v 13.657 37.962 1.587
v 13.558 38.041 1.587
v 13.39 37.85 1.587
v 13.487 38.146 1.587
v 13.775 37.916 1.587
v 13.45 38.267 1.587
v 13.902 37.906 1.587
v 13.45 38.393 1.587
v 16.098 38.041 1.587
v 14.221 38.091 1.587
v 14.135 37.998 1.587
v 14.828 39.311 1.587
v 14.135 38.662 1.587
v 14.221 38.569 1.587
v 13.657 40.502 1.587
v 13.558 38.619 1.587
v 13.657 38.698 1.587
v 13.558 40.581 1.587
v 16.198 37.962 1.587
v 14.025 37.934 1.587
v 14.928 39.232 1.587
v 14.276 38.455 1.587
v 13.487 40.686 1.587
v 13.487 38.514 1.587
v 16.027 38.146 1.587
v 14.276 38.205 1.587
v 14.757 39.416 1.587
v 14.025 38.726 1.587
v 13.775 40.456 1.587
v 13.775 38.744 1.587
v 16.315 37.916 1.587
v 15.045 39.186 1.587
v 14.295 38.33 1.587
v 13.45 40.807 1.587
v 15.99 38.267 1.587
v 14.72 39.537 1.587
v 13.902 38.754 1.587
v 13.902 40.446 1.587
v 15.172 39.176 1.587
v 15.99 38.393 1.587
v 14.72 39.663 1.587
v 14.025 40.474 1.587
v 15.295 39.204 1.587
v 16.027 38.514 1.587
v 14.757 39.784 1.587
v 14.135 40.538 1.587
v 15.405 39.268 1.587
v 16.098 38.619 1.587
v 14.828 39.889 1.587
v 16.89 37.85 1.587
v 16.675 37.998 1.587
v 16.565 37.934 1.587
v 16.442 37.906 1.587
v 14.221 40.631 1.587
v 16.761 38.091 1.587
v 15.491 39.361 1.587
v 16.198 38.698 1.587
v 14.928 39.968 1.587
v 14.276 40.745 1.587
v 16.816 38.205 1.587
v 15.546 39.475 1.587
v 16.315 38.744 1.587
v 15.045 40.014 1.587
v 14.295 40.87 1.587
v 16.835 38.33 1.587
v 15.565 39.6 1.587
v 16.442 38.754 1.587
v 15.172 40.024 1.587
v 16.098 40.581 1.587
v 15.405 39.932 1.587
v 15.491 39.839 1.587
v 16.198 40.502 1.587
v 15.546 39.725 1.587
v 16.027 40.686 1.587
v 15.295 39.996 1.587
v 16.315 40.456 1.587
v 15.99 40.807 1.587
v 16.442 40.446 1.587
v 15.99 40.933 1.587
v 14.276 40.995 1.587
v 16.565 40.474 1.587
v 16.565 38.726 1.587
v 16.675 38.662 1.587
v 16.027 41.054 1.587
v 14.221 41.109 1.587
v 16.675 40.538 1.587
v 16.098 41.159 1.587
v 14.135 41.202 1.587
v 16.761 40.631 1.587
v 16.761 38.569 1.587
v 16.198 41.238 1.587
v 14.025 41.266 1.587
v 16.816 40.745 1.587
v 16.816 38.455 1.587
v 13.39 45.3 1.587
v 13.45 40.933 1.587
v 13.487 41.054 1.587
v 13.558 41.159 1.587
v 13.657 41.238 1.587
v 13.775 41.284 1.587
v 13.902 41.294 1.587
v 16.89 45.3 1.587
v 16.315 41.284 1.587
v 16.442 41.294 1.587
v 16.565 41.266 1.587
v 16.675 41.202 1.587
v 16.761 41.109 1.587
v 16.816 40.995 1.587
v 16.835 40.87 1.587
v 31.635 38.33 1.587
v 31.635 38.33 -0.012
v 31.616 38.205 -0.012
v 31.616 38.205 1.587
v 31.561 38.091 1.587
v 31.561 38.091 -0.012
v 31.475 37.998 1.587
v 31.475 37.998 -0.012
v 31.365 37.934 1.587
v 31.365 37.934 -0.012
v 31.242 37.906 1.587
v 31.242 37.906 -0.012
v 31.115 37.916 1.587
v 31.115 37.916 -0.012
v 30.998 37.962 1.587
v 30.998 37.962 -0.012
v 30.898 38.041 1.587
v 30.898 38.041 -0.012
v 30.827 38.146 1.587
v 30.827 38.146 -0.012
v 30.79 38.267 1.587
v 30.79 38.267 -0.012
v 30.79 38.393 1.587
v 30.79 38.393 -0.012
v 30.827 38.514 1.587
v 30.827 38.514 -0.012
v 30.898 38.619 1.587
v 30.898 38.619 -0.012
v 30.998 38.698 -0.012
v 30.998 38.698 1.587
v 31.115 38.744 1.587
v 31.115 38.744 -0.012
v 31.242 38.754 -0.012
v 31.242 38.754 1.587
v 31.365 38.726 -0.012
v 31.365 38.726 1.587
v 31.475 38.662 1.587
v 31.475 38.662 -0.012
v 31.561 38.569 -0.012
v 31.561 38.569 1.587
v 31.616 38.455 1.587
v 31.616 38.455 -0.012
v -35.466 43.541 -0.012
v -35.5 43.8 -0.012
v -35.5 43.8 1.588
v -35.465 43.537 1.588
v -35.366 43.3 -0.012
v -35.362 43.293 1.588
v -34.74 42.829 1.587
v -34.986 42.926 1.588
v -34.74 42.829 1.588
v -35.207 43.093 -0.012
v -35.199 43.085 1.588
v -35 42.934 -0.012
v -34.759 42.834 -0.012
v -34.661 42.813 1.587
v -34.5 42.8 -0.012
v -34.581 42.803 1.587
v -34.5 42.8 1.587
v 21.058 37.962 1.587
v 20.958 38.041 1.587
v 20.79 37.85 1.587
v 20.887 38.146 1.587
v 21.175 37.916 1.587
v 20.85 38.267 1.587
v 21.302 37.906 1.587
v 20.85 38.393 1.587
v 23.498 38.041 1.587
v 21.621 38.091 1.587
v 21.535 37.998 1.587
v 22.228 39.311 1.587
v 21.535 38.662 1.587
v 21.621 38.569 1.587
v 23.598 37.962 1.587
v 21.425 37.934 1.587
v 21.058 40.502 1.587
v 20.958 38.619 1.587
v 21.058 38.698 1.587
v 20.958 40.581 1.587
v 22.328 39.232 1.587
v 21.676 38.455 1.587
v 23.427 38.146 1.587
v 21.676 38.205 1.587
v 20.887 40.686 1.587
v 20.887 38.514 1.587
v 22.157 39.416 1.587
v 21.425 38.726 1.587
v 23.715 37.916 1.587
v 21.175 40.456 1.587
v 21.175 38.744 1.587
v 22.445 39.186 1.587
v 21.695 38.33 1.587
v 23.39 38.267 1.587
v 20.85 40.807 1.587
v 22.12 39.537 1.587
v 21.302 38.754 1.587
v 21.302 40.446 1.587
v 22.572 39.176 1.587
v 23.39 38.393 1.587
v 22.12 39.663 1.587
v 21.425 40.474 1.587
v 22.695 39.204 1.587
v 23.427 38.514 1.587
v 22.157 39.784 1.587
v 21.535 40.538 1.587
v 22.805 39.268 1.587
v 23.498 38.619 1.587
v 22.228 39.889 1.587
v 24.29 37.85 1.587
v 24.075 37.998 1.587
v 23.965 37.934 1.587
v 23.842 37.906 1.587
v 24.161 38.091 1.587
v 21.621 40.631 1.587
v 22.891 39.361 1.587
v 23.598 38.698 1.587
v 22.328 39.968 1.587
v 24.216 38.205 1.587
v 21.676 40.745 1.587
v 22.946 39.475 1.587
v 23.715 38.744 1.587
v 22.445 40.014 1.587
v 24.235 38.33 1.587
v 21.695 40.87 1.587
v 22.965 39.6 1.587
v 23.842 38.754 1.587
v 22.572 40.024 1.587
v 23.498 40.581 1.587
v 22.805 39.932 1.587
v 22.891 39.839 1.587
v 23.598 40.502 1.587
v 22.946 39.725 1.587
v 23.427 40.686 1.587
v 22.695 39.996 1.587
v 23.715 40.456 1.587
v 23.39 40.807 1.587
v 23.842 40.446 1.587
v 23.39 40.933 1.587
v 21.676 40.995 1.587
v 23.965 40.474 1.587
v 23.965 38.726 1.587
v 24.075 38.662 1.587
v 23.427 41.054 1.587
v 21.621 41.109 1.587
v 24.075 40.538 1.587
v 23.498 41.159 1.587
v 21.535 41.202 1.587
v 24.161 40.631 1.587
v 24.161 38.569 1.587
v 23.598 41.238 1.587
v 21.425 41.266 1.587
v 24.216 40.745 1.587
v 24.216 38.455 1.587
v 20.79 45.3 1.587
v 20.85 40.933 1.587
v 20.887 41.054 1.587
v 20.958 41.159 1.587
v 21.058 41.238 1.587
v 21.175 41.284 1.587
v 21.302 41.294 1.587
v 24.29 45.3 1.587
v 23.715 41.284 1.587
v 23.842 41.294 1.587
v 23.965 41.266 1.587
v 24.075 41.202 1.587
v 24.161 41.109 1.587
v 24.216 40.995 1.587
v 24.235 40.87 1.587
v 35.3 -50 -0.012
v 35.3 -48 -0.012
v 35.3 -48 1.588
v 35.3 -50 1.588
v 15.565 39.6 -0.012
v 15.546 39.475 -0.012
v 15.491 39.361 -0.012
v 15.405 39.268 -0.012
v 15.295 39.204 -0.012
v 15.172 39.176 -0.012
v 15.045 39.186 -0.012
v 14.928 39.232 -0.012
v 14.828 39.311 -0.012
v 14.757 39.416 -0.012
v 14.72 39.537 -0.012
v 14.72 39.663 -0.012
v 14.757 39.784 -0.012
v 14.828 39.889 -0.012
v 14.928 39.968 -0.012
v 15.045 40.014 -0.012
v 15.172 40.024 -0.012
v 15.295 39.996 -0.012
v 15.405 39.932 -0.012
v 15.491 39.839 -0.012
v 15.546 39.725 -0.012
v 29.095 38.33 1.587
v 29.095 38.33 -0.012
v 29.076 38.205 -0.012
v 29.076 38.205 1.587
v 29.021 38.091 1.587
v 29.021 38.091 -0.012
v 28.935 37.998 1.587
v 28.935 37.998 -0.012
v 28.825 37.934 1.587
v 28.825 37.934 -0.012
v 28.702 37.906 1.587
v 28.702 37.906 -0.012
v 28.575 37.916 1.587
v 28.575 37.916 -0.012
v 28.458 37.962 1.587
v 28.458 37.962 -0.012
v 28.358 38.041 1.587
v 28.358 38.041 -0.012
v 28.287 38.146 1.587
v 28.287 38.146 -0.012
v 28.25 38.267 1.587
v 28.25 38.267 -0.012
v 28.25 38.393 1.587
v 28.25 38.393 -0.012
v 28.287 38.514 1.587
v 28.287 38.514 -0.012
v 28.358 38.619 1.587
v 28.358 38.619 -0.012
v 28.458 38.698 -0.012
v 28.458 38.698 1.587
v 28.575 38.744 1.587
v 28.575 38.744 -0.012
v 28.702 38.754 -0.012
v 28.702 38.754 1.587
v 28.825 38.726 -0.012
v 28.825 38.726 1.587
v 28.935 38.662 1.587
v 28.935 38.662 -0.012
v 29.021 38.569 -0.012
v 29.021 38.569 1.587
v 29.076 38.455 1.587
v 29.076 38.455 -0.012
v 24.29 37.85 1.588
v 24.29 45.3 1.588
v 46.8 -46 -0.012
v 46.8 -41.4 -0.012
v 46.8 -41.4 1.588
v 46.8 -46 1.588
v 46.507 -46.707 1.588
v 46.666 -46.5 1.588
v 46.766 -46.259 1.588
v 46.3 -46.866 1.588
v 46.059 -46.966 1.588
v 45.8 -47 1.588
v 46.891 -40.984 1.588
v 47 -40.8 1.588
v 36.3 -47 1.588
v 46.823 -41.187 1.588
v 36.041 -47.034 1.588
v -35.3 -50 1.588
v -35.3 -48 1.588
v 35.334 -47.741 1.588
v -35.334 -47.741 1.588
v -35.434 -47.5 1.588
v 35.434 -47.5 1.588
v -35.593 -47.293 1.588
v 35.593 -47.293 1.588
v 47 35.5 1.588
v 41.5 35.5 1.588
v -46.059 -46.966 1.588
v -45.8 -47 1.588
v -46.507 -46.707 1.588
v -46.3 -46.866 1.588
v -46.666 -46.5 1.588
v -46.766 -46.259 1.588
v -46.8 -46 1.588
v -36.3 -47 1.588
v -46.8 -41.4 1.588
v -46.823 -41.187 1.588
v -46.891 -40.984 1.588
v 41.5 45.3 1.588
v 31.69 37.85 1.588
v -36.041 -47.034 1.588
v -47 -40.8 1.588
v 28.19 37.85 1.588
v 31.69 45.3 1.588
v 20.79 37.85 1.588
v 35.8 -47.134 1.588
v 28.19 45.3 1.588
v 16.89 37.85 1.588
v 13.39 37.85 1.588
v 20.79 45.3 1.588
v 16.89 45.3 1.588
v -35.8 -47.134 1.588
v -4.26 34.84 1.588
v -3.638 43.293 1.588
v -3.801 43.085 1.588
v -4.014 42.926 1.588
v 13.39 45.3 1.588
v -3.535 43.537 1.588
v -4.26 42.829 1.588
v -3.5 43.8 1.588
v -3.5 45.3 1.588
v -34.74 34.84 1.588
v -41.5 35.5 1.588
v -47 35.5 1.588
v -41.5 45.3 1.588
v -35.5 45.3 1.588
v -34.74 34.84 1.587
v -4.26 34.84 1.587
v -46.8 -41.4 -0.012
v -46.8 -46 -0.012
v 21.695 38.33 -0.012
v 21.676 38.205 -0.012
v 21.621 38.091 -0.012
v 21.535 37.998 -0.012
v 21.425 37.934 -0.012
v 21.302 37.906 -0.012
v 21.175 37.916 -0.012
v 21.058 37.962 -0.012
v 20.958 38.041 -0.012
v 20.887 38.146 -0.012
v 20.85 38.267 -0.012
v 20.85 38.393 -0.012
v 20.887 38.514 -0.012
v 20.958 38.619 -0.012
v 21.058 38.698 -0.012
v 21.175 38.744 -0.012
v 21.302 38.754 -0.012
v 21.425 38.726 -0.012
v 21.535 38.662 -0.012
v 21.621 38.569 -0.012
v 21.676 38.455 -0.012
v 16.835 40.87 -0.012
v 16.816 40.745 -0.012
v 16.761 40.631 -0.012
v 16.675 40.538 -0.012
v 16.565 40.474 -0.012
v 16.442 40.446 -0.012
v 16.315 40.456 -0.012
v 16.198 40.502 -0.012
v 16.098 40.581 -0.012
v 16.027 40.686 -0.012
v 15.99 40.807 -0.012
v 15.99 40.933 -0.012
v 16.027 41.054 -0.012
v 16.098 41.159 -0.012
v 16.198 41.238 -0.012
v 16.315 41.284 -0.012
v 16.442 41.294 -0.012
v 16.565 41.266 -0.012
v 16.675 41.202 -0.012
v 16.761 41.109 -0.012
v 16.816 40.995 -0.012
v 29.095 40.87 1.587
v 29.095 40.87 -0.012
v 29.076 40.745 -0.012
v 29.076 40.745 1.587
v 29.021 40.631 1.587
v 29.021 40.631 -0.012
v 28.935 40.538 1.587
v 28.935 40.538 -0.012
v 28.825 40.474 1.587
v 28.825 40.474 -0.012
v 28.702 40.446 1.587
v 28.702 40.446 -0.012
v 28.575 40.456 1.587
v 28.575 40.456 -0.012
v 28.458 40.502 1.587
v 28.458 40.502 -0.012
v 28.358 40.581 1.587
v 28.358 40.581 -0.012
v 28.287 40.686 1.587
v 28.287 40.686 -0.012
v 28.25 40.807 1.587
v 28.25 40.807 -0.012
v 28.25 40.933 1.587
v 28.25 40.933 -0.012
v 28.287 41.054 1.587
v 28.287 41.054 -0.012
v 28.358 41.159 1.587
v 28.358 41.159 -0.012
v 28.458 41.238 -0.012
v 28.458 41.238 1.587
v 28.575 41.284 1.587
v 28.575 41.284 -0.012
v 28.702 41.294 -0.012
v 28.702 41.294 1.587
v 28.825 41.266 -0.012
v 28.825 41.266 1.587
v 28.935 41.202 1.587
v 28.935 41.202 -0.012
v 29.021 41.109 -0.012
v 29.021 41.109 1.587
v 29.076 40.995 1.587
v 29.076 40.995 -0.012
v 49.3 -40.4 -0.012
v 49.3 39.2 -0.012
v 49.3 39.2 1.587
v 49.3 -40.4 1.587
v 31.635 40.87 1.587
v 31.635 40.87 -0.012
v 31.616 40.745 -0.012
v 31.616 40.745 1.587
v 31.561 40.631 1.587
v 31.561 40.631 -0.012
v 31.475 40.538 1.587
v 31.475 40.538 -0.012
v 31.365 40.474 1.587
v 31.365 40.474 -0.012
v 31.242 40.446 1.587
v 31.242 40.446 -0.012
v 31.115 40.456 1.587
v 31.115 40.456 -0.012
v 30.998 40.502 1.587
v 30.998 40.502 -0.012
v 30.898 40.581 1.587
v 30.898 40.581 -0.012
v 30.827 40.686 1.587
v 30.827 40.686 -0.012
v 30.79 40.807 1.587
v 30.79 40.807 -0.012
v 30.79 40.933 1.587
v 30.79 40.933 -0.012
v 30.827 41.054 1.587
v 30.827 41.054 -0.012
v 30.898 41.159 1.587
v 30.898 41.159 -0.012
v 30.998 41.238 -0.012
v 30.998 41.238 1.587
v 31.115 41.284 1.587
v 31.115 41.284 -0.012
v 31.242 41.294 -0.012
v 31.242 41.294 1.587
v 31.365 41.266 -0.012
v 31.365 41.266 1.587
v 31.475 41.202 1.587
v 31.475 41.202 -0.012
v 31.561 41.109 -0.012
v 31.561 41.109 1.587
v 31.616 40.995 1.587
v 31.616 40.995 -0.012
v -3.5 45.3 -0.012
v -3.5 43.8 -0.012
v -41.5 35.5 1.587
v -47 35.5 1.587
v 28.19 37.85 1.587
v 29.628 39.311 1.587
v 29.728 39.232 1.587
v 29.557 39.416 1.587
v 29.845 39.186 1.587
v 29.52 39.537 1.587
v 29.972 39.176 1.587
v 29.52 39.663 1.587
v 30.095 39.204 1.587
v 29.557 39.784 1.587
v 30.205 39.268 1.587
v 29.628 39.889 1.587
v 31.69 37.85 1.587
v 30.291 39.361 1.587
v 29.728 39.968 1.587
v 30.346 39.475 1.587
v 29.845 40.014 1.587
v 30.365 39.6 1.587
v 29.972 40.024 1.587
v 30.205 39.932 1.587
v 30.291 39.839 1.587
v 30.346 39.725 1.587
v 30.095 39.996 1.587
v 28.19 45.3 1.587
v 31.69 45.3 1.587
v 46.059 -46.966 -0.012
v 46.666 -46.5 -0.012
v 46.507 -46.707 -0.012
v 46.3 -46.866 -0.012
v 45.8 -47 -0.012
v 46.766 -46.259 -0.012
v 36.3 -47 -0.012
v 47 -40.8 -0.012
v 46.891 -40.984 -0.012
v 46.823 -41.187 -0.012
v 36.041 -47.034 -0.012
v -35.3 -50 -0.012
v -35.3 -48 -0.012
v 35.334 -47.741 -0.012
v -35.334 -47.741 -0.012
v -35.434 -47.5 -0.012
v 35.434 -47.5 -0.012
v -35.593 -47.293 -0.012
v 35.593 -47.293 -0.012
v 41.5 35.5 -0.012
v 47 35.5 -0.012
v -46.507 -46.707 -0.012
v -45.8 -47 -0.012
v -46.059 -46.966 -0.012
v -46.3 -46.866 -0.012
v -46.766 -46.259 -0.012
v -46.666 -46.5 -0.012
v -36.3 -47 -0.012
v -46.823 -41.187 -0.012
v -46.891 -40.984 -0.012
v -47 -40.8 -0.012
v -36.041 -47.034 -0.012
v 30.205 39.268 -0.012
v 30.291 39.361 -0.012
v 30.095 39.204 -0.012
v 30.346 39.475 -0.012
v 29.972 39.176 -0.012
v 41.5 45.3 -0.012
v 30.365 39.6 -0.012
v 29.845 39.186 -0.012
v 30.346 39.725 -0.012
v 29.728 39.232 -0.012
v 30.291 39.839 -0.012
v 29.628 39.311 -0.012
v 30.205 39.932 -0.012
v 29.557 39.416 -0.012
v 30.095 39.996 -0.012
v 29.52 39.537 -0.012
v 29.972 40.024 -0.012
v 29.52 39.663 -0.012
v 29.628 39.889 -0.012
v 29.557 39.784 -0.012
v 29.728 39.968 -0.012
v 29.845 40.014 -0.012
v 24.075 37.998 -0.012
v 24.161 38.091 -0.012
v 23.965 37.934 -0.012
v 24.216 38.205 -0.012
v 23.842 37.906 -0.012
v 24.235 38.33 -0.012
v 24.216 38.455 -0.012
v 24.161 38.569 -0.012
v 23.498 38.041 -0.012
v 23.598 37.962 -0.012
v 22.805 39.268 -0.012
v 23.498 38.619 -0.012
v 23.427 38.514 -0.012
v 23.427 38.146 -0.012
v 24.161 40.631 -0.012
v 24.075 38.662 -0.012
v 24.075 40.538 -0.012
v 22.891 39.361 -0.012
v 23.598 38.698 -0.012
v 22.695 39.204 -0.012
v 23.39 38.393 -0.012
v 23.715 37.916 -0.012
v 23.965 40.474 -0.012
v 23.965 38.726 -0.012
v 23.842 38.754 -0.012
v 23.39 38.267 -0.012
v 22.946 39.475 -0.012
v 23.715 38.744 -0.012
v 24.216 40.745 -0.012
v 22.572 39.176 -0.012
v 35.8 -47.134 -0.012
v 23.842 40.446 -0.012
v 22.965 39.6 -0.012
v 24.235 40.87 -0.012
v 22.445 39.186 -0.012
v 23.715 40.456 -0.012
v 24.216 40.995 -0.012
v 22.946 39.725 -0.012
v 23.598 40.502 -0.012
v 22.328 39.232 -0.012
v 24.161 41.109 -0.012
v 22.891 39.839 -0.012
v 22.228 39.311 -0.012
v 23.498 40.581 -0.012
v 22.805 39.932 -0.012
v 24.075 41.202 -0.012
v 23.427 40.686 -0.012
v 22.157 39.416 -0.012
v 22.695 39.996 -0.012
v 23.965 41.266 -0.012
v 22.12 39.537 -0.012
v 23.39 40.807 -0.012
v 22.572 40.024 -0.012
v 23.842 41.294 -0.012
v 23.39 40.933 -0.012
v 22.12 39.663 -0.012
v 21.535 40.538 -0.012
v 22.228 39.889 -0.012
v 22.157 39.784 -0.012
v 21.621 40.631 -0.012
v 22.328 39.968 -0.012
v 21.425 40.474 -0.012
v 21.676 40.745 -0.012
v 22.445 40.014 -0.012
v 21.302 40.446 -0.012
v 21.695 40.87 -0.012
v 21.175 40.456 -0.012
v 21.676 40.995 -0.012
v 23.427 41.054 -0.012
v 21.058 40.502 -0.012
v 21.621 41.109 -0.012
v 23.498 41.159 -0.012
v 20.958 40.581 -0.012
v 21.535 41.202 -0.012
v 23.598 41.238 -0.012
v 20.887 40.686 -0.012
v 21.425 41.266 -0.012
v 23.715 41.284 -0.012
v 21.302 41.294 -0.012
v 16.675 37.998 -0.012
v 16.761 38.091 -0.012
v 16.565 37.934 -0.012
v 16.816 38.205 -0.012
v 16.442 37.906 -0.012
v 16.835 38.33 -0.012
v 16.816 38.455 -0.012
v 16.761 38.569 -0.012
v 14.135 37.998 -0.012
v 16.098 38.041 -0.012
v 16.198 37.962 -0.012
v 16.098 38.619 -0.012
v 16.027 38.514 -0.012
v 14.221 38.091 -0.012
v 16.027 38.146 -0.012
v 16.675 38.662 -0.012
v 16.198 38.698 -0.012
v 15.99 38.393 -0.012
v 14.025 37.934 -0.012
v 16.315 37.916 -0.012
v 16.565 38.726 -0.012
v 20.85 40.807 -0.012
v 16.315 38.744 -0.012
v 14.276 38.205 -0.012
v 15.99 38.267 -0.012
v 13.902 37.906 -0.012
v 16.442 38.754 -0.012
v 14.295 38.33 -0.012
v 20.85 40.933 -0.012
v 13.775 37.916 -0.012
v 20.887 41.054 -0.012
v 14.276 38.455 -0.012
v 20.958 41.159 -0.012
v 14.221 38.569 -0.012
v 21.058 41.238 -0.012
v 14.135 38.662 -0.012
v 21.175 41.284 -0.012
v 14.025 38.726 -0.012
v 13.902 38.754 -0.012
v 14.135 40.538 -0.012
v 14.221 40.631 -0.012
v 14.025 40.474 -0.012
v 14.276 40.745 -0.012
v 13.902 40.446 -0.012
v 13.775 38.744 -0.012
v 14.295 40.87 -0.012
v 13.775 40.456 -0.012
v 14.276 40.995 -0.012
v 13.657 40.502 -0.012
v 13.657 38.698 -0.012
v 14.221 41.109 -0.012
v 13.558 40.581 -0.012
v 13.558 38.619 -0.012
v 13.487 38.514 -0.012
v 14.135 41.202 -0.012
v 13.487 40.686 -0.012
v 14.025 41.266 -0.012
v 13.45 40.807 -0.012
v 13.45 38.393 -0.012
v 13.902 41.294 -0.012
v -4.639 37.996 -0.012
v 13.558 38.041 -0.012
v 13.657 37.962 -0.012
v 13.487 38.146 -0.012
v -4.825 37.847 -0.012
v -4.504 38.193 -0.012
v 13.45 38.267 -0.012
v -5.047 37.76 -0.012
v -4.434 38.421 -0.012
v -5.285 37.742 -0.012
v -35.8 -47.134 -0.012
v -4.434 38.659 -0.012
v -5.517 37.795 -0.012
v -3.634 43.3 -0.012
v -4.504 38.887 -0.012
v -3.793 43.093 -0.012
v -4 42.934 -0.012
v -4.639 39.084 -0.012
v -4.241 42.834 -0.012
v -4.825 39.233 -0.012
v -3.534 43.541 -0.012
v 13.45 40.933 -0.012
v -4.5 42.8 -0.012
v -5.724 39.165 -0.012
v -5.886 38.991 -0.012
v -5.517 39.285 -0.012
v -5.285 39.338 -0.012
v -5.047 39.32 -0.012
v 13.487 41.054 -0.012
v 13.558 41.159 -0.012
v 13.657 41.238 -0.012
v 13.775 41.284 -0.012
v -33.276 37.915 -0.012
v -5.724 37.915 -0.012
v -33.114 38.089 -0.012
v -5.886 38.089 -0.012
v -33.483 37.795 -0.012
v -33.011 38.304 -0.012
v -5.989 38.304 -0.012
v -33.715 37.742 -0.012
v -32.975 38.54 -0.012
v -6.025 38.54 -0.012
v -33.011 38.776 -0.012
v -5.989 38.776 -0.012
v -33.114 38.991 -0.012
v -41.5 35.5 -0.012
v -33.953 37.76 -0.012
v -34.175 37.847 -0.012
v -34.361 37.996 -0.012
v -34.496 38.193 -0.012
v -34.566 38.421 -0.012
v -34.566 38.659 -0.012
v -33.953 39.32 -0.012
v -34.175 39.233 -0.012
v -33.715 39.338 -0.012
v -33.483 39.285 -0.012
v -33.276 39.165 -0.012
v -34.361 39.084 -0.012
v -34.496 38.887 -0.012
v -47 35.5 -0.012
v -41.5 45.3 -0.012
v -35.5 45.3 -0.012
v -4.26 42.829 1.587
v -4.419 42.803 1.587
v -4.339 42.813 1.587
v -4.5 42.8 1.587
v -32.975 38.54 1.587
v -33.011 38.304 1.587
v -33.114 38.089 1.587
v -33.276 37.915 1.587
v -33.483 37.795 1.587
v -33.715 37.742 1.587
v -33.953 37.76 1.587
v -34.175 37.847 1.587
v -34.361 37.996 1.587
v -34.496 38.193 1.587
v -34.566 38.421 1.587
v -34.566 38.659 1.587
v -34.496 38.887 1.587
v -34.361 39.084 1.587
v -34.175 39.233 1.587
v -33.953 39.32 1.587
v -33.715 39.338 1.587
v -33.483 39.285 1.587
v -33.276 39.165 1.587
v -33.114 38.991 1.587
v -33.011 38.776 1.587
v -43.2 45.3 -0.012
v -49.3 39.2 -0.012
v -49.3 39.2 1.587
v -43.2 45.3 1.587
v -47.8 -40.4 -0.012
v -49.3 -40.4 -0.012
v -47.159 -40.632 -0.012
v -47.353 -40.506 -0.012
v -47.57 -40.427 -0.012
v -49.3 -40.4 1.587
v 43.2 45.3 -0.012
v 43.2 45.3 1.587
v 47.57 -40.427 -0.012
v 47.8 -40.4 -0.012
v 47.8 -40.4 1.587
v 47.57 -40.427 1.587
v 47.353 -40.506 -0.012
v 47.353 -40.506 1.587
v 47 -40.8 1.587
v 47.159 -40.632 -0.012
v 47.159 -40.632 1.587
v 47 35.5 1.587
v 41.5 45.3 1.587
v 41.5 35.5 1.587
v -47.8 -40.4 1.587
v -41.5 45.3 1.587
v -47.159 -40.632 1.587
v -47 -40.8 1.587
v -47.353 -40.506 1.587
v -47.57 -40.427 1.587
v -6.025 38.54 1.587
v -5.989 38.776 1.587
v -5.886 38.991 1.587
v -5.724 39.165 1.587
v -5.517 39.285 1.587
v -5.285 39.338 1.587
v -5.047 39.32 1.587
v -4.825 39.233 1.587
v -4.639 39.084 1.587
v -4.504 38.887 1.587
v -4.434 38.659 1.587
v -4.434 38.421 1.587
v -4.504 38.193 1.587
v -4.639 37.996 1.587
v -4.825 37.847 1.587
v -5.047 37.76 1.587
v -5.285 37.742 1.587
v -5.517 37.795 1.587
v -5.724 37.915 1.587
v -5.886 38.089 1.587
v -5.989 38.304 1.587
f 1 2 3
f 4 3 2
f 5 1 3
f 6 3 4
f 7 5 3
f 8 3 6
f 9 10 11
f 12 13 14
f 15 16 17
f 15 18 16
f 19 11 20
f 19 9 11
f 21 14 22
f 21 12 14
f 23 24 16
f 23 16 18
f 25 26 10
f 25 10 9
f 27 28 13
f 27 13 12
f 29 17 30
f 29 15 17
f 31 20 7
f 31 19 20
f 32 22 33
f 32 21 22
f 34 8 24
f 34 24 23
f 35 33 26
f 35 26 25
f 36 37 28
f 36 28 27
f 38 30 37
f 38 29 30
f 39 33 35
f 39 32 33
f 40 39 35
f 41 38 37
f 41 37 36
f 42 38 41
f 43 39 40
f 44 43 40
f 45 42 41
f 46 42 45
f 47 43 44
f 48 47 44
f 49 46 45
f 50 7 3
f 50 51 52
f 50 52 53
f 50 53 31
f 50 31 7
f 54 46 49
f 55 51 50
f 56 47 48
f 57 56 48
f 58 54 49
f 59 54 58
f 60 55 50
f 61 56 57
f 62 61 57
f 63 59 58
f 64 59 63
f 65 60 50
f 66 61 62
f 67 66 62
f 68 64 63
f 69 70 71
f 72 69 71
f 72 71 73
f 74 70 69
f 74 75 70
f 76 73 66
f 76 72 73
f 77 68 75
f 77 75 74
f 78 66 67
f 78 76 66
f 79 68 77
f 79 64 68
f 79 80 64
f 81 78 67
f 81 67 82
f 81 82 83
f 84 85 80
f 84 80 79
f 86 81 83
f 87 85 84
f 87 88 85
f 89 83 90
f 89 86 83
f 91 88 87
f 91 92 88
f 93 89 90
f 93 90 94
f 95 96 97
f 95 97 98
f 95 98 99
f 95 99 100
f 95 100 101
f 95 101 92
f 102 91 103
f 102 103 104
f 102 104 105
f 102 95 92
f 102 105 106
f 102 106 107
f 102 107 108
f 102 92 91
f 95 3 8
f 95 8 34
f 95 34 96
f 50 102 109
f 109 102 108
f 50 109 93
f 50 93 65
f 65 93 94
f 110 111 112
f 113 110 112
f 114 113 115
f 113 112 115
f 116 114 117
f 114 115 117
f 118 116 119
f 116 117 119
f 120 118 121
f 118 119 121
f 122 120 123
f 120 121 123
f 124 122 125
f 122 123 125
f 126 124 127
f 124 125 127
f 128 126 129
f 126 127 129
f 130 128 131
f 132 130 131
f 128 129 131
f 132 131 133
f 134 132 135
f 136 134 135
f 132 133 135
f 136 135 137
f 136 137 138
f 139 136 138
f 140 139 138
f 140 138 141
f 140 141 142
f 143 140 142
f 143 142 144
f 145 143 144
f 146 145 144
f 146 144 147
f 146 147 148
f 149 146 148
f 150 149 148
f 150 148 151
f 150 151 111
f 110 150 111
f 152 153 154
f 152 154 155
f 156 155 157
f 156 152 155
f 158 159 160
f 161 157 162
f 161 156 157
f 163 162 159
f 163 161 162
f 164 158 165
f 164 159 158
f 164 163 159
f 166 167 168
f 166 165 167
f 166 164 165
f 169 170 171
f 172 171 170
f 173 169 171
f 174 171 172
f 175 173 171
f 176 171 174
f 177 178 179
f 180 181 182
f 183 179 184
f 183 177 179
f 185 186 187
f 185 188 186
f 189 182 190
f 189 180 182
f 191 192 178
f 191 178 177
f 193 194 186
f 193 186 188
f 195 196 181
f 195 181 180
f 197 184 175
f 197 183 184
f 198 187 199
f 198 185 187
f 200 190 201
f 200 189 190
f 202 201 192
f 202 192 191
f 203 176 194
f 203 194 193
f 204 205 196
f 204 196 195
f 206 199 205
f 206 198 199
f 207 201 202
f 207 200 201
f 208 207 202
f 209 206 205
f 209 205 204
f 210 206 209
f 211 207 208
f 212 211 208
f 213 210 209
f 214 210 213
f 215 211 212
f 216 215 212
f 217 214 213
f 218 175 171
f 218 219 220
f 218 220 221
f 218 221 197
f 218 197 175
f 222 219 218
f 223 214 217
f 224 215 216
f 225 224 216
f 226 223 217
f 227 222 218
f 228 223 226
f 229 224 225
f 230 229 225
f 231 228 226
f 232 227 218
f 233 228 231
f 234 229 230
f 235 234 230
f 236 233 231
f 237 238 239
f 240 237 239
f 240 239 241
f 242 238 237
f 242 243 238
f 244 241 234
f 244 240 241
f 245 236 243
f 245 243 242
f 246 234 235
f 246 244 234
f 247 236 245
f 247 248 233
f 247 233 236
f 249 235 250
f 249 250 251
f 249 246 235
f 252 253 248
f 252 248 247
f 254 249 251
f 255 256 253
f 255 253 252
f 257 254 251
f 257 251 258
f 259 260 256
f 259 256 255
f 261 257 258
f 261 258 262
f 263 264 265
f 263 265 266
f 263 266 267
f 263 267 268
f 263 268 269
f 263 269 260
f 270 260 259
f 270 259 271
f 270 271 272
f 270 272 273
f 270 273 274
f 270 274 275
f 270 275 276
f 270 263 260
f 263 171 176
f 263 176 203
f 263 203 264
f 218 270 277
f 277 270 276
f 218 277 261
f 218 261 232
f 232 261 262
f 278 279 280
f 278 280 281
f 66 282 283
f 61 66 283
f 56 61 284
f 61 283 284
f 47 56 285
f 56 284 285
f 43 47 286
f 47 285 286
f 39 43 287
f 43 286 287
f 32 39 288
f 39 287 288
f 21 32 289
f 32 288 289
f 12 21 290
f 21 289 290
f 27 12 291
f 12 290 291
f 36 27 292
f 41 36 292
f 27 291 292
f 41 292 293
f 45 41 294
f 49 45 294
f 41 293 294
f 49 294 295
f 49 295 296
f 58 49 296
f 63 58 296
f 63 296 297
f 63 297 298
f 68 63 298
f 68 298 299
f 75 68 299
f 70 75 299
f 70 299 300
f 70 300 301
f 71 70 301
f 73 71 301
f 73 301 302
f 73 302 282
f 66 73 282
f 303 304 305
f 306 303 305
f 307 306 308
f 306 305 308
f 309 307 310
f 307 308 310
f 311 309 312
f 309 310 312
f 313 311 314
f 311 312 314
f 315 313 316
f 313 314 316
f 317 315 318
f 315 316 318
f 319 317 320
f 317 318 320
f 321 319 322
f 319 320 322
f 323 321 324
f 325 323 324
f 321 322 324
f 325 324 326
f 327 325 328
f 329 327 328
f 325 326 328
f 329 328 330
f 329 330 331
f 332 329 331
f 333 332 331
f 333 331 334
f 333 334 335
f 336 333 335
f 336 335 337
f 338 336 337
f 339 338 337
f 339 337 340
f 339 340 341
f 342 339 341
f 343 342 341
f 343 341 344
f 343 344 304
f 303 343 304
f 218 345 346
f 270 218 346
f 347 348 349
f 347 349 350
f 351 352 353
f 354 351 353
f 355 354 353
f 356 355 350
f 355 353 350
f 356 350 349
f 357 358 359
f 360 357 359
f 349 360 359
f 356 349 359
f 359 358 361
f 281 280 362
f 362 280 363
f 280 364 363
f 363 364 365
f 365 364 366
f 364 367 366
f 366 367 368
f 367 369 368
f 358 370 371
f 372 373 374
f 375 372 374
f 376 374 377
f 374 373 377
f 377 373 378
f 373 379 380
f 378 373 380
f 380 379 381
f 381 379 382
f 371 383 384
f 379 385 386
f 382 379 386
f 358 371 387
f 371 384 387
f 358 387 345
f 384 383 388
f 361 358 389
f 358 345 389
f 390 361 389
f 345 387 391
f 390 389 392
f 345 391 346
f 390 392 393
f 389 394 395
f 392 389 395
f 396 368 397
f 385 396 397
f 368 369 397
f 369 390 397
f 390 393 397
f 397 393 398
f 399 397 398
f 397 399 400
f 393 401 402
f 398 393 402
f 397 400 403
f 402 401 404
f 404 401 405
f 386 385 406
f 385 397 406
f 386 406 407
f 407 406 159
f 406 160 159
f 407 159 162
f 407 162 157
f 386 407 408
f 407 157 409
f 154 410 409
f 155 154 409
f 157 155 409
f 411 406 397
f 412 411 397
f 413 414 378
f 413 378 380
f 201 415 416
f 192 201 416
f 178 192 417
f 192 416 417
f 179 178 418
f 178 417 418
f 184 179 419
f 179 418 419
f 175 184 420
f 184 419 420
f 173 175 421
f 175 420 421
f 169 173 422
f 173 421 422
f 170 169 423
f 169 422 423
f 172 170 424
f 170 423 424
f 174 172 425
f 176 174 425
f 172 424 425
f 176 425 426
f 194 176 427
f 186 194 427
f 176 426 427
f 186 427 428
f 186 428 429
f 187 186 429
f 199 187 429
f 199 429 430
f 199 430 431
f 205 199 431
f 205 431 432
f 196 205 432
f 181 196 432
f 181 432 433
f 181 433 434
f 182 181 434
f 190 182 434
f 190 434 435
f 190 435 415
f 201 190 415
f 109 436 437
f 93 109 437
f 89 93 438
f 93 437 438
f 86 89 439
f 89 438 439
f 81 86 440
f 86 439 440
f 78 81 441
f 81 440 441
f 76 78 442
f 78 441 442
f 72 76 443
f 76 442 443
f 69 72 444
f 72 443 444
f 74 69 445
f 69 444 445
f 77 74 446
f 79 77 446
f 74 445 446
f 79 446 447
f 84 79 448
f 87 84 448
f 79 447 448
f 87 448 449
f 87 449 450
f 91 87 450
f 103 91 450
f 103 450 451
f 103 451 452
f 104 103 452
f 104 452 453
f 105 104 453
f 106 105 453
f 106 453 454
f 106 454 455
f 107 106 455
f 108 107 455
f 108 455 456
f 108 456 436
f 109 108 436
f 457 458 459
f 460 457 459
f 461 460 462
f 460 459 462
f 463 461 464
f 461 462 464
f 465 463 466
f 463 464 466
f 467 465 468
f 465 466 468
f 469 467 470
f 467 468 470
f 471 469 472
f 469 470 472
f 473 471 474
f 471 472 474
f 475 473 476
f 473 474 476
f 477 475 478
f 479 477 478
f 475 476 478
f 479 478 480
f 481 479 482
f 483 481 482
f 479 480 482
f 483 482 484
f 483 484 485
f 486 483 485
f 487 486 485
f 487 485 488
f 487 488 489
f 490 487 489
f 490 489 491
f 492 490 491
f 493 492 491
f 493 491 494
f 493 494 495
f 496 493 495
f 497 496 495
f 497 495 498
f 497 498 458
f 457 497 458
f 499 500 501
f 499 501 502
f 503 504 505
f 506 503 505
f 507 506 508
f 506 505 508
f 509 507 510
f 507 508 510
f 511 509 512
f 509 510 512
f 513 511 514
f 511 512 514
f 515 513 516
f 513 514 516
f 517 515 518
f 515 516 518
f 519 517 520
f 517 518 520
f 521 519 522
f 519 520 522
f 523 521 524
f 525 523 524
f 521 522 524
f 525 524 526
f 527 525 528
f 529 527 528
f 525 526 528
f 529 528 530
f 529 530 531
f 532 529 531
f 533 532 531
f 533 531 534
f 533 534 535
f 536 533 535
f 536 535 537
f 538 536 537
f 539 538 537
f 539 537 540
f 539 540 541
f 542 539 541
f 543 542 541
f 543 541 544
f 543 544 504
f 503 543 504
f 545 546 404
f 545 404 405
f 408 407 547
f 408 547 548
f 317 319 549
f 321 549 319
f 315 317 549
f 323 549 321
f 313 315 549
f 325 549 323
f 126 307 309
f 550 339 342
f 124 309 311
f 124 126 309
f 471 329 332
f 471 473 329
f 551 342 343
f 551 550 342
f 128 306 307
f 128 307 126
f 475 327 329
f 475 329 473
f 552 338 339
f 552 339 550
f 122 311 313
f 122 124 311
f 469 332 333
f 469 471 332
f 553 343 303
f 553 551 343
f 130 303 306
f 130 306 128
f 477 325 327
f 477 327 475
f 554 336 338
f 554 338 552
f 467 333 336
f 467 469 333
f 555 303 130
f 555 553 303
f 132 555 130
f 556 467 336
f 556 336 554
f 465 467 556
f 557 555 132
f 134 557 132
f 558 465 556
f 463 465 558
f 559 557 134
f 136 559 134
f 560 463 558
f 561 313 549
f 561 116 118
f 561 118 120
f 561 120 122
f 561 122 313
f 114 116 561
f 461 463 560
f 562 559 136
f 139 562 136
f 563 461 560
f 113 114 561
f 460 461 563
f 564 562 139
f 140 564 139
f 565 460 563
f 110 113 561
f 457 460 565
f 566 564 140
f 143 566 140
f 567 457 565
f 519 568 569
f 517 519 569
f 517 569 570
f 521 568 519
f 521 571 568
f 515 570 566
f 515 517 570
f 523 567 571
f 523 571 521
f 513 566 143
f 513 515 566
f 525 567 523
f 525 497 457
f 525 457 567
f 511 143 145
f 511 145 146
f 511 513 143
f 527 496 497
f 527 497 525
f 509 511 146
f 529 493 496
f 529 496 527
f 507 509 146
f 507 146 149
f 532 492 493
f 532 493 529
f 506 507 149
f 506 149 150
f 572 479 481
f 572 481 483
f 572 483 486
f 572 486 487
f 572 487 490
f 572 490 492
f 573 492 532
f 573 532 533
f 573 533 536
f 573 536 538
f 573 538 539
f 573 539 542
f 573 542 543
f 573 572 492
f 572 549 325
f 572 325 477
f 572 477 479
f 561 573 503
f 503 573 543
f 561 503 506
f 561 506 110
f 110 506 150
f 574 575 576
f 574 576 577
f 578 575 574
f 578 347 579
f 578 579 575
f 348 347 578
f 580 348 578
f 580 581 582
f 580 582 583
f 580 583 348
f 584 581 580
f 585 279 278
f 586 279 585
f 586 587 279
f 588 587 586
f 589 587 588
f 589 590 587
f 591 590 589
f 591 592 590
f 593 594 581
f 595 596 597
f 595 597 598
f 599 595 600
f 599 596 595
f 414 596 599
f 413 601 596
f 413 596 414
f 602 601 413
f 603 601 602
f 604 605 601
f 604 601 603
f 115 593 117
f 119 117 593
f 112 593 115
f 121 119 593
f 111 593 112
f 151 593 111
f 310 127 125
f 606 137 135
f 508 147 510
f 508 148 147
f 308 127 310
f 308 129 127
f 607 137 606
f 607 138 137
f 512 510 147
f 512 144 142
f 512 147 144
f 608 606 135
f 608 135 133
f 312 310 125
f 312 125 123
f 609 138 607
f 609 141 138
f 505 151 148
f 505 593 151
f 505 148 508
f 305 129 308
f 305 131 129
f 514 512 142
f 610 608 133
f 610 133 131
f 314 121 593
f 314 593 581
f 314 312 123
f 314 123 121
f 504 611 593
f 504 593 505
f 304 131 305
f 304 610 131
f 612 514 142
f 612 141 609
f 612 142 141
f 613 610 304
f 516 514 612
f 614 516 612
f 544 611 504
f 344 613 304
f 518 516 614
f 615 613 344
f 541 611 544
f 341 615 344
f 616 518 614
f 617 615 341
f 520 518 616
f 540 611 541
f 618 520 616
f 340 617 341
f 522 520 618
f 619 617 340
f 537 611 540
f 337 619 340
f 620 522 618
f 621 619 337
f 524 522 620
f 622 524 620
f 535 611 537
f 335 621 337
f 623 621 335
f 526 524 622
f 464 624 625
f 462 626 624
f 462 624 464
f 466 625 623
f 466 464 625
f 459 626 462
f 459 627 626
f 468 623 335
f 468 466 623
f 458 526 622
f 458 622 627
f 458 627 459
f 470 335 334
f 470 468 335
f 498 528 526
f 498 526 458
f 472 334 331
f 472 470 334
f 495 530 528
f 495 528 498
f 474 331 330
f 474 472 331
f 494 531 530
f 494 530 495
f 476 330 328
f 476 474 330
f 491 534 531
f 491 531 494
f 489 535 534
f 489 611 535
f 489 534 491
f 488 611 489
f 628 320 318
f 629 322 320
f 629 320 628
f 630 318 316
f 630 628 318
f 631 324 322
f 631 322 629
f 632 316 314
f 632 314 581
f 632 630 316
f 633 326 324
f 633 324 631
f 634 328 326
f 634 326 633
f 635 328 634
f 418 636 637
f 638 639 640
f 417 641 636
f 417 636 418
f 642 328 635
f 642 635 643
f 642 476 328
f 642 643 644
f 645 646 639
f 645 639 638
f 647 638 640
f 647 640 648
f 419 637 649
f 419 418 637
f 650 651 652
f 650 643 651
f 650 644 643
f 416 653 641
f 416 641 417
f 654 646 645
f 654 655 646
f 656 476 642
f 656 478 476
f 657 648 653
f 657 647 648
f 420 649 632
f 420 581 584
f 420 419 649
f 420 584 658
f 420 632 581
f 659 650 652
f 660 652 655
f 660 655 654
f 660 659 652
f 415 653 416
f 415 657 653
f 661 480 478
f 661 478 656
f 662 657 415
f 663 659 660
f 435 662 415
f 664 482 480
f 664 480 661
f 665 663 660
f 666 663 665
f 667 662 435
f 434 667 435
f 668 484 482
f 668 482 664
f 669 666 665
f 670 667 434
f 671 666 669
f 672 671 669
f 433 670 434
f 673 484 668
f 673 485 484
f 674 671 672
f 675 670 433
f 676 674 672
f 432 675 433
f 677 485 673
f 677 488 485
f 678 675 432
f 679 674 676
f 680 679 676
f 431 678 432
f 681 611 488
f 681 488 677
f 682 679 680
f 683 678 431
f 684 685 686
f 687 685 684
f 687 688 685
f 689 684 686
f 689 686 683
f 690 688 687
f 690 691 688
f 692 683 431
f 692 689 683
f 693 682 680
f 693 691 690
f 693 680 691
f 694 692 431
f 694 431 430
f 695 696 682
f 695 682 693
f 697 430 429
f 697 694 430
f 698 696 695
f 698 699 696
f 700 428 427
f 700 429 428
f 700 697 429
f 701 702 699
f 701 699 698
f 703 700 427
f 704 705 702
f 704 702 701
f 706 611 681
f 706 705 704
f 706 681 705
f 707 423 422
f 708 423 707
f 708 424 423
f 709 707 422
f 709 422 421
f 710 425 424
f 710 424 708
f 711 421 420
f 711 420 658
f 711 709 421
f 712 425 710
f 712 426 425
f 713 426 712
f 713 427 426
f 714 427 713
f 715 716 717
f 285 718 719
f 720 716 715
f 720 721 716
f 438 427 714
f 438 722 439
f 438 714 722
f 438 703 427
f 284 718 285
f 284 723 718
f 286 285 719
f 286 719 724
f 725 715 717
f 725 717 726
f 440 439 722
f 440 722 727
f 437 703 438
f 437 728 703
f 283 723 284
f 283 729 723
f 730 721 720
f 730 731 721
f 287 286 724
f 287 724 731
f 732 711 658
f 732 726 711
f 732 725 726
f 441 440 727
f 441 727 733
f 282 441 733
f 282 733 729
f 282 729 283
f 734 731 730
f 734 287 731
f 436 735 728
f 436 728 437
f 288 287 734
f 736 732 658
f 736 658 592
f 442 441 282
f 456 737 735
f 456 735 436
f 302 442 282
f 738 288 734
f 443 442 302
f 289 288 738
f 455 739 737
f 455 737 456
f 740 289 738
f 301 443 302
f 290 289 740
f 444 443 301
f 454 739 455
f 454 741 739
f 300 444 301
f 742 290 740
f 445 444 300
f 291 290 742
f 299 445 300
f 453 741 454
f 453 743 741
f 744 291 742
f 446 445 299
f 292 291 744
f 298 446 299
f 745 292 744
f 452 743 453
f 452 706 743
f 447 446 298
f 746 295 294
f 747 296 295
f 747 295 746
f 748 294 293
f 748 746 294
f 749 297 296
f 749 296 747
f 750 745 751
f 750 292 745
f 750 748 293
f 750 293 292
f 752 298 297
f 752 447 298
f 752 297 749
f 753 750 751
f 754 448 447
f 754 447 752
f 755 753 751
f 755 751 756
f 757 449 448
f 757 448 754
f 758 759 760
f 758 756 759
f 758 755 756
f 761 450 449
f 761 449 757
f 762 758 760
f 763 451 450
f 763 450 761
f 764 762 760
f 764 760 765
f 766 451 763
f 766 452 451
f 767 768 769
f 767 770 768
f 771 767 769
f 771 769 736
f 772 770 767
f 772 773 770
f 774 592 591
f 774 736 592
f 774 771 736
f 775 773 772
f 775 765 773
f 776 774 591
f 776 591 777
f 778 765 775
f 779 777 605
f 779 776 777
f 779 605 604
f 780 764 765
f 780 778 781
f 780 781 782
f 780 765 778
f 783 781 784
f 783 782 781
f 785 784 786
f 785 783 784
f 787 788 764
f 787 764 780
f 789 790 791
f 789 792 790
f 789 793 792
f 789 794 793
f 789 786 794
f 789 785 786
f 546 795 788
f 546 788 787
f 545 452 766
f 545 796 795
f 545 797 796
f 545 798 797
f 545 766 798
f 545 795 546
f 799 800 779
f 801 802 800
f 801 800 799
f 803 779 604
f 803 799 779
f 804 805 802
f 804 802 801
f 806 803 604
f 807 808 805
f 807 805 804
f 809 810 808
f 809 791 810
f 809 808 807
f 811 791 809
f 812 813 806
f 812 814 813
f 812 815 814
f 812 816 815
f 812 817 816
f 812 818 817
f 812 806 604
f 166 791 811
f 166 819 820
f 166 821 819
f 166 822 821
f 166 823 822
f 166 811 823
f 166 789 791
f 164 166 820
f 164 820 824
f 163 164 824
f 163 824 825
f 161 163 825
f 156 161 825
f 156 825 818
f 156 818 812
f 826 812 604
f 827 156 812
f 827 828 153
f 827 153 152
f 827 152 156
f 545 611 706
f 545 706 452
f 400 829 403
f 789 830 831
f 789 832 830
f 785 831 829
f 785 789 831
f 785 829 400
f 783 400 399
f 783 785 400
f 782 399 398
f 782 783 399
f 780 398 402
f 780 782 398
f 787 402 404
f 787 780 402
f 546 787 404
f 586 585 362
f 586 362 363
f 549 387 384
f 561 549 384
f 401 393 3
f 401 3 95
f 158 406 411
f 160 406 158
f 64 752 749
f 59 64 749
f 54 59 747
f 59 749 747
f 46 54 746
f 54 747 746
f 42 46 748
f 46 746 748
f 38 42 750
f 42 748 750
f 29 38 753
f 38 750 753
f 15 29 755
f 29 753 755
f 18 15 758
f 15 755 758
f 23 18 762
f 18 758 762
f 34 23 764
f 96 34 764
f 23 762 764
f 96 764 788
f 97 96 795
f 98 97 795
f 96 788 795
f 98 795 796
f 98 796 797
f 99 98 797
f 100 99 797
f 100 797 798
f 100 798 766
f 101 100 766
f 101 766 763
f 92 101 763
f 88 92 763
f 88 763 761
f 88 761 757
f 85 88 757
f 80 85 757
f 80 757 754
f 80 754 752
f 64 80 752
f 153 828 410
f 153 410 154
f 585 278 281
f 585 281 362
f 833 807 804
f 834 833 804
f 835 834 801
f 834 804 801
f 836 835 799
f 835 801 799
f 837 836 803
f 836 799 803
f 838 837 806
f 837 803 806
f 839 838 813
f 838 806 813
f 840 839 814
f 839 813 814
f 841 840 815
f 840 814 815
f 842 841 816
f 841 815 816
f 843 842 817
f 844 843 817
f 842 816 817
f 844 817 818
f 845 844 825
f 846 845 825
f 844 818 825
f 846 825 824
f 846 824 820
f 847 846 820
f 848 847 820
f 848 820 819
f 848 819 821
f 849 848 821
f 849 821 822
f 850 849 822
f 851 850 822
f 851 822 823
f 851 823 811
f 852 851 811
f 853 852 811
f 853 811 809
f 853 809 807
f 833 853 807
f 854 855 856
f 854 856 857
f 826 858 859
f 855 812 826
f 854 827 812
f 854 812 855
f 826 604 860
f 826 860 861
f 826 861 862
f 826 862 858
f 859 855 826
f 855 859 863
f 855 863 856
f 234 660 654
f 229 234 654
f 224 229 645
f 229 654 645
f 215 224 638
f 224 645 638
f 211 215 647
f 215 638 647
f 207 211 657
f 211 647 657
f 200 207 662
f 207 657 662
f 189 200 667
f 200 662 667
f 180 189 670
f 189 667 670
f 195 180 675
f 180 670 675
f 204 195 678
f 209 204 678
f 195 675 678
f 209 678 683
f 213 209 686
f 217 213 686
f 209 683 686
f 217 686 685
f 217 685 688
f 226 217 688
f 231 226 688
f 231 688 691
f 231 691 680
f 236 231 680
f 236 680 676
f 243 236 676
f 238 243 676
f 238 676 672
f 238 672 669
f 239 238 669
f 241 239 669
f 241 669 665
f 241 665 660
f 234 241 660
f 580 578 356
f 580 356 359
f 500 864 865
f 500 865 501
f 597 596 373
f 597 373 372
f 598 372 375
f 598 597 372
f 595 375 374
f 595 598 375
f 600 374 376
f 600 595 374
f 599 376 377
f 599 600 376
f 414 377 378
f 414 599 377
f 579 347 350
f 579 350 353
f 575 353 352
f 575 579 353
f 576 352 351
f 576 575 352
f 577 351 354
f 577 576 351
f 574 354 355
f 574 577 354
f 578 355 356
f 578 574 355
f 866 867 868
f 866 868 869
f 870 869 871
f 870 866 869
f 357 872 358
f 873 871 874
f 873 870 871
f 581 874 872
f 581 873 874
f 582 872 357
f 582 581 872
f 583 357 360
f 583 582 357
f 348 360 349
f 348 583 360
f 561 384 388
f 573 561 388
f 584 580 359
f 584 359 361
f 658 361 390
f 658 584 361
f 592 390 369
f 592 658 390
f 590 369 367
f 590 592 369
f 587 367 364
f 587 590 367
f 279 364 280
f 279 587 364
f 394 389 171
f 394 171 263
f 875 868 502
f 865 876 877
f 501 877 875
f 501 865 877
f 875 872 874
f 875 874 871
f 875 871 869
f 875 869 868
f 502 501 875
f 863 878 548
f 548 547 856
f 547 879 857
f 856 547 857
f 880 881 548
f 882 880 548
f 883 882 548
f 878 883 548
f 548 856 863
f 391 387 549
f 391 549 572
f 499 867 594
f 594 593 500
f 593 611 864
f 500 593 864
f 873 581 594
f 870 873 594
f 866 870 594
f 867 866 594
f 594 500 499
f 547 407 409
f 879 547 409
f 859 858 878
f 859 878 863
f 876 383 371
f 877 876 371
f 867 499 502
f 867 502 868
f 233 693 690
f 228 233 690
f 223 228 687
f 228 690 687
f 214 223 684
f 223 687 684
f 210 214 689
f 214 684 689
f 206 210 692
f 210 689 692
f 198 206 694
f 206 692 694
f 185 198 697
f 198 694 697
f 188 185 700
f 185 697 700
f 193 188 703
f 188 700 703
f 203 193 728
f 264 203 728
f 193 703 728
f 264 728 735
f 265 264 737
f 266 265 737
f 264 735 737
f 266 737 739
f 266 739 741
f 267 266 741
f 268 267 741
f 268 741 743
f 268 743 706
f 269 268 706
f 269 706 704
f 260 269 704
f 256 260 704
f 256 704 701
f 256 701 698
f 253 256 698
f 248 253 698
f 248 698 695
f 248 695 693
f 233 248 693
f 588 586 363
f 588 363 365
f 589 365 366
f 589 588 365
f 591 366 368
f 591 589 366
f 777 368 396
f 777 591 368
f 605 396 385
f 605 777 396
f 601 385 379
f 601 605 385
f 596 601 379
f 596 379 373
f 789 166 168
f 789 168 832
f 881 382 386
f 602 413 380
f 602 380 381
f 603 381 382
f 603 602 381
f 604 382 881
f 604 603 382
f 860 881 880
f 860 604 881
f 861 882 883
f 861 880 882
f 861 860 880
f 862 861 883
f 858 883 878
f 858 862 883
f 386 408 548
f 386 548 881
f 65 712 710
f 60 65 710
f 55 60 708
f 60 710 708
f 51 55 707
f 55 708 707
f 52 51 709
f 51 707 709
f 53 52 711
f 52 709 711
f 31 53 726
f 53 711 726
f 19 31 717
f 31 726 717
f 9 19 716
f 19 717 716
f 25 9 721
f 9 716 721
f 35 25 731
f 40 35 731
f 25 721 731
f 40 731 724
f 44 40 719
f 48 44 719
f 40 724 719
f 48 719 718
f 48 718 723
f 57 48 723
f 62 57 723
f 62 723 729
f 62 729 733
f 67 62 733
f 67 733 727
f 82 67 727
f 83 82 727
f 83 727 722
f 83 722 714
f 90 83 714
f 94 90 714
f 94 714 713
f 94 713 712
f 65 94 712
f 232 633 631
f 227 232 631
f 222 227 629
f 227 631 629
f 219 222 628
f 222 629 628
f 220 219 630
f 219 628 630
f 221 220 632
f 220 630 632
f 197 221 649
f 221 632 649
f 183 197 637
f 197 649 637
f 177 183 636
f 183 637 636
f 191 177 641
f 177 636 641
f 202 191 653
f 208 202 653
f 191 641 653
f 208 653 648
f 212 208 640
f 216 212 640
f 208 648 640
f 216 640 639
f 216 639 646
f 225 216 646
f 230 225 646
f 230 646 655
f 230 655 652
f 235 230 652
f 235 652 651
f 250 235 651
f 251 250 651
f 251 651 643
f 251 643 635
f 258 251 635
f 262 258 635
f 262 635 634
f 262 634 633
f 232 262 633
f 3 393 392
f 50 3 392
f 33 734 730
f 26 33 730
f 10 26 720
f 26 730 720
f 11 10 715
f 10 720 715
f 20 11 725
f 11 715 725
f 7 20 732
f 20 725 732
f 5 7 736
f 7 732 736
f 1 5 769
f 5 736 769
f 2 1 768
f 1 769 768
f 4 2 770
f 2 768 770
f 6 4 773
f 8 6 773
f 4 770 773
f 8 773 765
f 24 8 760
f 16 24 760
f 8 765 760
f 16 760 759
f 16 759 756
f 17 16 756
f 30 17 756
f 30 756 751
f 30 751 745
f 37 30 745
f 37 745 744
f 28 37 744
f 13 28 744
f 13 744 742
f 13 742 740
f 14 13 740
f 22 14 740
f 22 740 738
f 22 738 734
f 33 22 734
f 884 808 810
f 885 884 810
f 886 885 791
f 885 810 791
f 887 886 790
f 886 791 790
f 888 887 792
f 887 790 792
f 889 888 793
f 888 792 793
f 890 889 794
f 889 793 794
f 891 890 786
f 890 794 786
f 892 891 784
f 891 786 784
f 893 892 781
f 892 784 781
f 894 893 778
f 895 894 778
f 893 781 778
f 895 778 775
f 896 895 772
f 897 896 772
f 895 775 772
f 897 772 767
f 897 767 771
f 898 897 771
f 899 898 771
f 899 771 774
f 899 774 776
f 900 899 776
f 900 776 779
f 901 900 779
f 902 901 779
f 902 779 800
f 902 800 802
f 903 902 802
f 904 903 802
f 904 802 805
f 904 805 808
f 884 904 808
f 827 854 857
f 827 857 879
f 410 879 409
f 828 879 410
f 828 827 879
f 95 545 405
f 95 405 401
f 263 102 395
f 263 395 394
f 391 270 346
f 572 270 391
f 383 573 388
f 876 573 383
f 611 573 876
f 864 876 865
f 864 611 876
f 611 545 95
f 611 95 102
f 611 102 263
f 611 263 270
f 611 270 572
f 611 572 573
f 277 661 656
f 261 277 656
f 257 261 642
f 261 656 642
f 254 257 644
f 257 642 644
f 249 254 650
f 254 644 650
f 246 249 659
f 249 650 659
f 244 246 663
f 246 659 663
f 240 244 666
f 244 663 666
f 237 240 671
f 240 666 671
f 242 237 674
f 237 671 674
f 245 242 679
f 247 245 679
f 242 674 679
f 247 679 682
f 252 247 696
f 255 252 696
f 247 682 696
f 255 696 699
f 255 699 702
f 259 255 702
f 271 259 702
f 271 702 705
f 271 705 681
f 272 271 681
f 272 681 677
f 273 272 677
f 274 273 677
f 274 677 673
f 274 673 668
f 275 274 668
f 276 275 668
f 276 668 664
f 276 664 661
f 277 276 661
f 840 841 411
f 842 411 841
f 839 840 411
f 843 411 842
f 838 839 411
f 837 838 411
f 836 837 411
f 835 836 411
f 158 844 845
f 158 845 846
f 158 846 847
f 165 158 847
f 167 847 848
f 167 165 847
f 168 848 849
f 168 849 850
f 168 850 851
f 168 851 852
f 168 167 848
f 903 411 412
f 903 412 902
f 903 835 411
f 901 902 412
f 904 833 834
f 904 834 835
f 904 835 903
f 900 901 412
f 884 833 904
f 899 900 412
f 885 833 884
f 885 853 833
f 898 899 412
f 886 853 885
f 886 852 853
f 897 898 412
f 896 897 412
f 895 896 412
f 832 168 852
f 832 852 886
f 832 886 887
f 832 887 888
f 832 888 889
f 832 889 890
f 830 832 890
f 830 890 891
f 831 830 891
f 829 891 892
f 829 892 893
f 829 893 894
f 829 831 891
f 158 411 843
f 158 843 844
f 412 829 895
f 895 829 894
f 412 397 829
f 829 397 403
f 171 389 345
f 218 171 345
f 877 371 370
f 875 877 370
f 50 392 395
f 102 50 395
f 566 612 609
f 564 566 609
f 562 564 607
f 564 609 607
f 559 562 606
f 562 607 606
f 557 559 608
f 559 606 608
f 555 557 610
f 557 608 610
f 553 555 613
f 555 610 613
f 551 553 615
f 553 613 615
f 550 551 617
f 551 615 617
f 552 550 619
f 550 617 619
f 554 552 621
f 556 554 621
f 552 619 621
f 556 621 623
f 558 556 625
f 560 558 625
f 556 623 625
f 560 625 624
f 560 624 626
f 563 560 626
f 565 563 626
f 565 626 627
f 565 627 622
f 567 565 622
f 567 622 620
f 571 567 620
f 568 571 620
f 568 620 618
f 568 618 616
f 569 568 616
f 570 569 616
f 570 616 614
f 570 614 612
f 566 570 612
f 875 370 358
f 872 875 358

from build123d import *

# Parameters (mm, degrees)
SKETCH1_R           = 0.425
SKETCH1_R_2         = 0.8
BOSS_EXTRUDE1_DEPTH = 1.6
CUT_EXTRUDE1_DEPTH  = 0.0001
CUT_EXTRUDE2_DEPTH  = 0.0001
PARTFOOTPRINTS_W    = 30.48
PARTFOOTPRINTS_H    = 7.989227112
PARTFOOTPRINTS_W_2  = 3.5
PARTFOOTPRINTS_H_2  = 7.45
CUT_EXTRUDE3_DEPTH  = 0.0001


with BuildPart() as part:
    # Sketch1 → Boss-Extrude1 (new body)
    with BuildSketch(Plane(origin=(0, 0, -0.0125), x_dir=(-1, 0, 0), z_dir=(0, 0, -1))):
        with BuildLine():
            Line((35.3, -50), (35.3, -48))
            ThreePointArc((35.3, -48), (35.592893219, -47.292893219), (36.3, -47))
            Line((36.3, -47), (45.8, -47))
            ThreePointArc((45.8, -47), (46.507106781, -46.707106781), (46.8, -46))
            Line((46.8, -46), (46.8, -41.4))
            ThreePointArc((46.8, -41.4), (47.092893219, -40.692893219), (47.8, -40.4))
            Line((47.8, -40.4), (49.3, -40.4))
            Line((49.3, -40.4), (49.3, 39.2))
            Line((49.3, 39.2), (43.2, 45.3))
            Line((43.2, 45.3), (35.500000002, 45.3))
            Line((35.500000002, 45.3), (35.500000002, 43.8))
            ThreePointArc((35.500000002, 43.8), (35.207106783, 43.092893219), (34.500000002, 42.8))
            Line((34.500000002, 42.8), (4.499999998, 42.8))
            ThreePointArc((4.499999998, 42.8), (3.792893217, 43.092893219), (3.499999998, 43.8))
            Line((3.499999998, 43.8), (3.499999998, 45.3))
            Line((3.499999998, 45.3), (-43.2, 45.3))
            Line((-43.2, 45.3), (-49.3, 39.2))
            Line((-49.3, 39.2), (-49.3, -40.4))
            Line((-49.3, -40.4), (-47.8, -40.4))
            ThreePointArc((-47.8, -40.4), (-47.092893219, -40.692893219), (-46.8, -41.4))
            Line((-46.8, -41.4), (-46.8, -46))
            ThreePointArc((-46.8, -46), (-46.507106781, -46.707106781), (-45.8, -47))
            Line((-45.8, -47), (-36.3, -47))
            ThreePointArc((-36.3, -47), (-35.592893219, -47.292893219), (-35.3, -48))
            Line((-35.3, -48), (-35.3, -50))
            Line((-35.3, -50), (35.3, -50))
        make_face()
        with Locations(Location((-21.27, 40.87, 0), (0, 0, 180))):
            Circle(SKETCH1_R, mode=Mode.SUBTRACT)
        with Locations(Location((-23.81, 40.87, 0), (0, 0, 180))):
            Circle(SKETCH1_R, mode=Mode.SUBTRACT)
        with Locations(Location((-22.54, 39.6, 0), (0, 0, 180))):
            Circle(SKETCH1_R, mode=Mode.SUBTRACT)
        with Locations(Location((-13.87, 40.87, 0), (0, 0, 180))):
            Circle(SKETCH1_R, mode=Mode.SUBTRACT)
        with Locations(Location((-23.81, 38.33, 0), (0, 0, 180))):
            Circle(SKETCH1_R, mode=Mode.SUBTRACT)
        with Locations(Location((-16.41, 40.87, 0), (0, 0, 180))):
            Circle(SKETCH1_R, mode=Mode.SUBTRACT)
        with Locations(Location((-15.14, 39.6, 0), (0, 0, 180))):
            Circle(SKETCH1_R, mode=Mode.SUBTRACT)
        with Locations(Location((-21.27, 38.33, 0), (0, 0, 180))):
            Circle(SKETCH1_R, mode=Mode.SUBTRACT)
        with Locations(Location((-28.67, 40.87, 0), (0, 0, 180))):
            Circle(SKETCH1_R, mode=Mode.SUBTRACT)
        with Locations(Location((-31.21, 40.87, 0), (0, 0, 180))):
            Circle(SKETCH1_R, mode=Mode.SUBTRACT)
        with Locations(Location((-16.41, 38.33, 0), (0, 0, 180))):
            Circle(SKETCH1_R, mode=Mode.SUBTRACT)
        with Locations(Location((-29.94, 39.6, 0), (0, 0, 180))):
            Circle(SKETCH1_R, mode=Mode.SUBTRACT)
        with Locations(Location((-31.21, 38.33, 0), (0, 0, 180))):
            Circle(SKETCH1_R, mode=Mode.SUBTRACT)
        with Locations(Location((-28.67, 38.33, 0), (0, 0, 180))):
            Circle(SKETCH1_R, mode=Mode.SUBTRACT)
        with Locations(Location((33.775, 38.54, 0), (0, 0, 180))):
            Circle(SKETCH1_R_2, mode=Mode.SUBTRACT)
        with Locations((5.225, 38.54)):
            Circle(SKETCH1_R_2, mode=Mode.SUBTRACT)
        with Locations(Location((-13.87, 38.33, 0), (0, 0, 180))):
            Circle(SKETCH1_R, mode=Mode.SUBTRACT)
    extrude(amount=-BOSS_EXTRUDE1_DEPTH)

    # thermalContacts_lower → Cut-Extrude1 (cut)
    with BuildSketch(Plane(origin=(0, 0, -0.0125), x_dir=(-1, 0, 0), z_dir=(0, 0, -1))):
        Polygon((47, 35.5), (47, -41.5), (59.827263463, -41.5), (59.827263463, 47), (41.5, 47), (41.5, 41.5), (41.5, 35.5), align=None)
        Polygon((-47, 35.5), (-47, -41.5), (-56.192158269, -41.5), (-56.192158269, 47), (-41.5, 47), (-41.5, 41.5), (-41.5, 35.5), align=None)
    extrude(amount=-CUT_EXTRUDE1_DEPTH, mode=Mode.SUBTRACT)

    # thermalContacts_upper → Cut-Extrude2 (cut)
    with BuildSketch(Plane.XY.offset(1.5875)):
        Polygon((-47, 35.5), (-47, -41.5), (-56.192158269, -41.5), (-56.192158269, 47), (-41.5, 47), (-41.5, 41.5), (-41.5, 35.5), align=None)
        Polygon((47, 35.5), (47, -41.5), (59.827263463, -41.5), (59.827263463, 47), (41.5, 47), (41.5, 41.5), (41.5, 35.5), align=None)
    extrude(amount=-CUT_EXTRUDE2_DEPTH, mode=Mode.SUBTRACT)

    # partFootprints → Cut-Extrude3 (cut)
    with BuildSketch(Plane.XY.offset(1.5875)):
        with Locations((-19.5, 38.834613556)):
            Rectangle(PARTFOOTPRINTS_W, PARTFOOTPRINTS_H)
        with Locations((15.14, 41.575)):
            Rectangle(PARTFOOTPRINTS_W_2, PARTFOOTPRINTS_H_2)
        with Locations((22.54, 41.575)):
            Rectangle(PARTFOOTPRINTS_W_2, PARTFOOTPRINTS_H_2)
        with Locations((29.94, 41.575)):
            Rectangle(PARTFOOTPRINTS_W_2, PARTFOOTPRINTS_H_2)
    extrude(amount=-CUT_EXTRUDE3_DEPTH, mode=Mode.SUBTRACT)


solid = part.part
